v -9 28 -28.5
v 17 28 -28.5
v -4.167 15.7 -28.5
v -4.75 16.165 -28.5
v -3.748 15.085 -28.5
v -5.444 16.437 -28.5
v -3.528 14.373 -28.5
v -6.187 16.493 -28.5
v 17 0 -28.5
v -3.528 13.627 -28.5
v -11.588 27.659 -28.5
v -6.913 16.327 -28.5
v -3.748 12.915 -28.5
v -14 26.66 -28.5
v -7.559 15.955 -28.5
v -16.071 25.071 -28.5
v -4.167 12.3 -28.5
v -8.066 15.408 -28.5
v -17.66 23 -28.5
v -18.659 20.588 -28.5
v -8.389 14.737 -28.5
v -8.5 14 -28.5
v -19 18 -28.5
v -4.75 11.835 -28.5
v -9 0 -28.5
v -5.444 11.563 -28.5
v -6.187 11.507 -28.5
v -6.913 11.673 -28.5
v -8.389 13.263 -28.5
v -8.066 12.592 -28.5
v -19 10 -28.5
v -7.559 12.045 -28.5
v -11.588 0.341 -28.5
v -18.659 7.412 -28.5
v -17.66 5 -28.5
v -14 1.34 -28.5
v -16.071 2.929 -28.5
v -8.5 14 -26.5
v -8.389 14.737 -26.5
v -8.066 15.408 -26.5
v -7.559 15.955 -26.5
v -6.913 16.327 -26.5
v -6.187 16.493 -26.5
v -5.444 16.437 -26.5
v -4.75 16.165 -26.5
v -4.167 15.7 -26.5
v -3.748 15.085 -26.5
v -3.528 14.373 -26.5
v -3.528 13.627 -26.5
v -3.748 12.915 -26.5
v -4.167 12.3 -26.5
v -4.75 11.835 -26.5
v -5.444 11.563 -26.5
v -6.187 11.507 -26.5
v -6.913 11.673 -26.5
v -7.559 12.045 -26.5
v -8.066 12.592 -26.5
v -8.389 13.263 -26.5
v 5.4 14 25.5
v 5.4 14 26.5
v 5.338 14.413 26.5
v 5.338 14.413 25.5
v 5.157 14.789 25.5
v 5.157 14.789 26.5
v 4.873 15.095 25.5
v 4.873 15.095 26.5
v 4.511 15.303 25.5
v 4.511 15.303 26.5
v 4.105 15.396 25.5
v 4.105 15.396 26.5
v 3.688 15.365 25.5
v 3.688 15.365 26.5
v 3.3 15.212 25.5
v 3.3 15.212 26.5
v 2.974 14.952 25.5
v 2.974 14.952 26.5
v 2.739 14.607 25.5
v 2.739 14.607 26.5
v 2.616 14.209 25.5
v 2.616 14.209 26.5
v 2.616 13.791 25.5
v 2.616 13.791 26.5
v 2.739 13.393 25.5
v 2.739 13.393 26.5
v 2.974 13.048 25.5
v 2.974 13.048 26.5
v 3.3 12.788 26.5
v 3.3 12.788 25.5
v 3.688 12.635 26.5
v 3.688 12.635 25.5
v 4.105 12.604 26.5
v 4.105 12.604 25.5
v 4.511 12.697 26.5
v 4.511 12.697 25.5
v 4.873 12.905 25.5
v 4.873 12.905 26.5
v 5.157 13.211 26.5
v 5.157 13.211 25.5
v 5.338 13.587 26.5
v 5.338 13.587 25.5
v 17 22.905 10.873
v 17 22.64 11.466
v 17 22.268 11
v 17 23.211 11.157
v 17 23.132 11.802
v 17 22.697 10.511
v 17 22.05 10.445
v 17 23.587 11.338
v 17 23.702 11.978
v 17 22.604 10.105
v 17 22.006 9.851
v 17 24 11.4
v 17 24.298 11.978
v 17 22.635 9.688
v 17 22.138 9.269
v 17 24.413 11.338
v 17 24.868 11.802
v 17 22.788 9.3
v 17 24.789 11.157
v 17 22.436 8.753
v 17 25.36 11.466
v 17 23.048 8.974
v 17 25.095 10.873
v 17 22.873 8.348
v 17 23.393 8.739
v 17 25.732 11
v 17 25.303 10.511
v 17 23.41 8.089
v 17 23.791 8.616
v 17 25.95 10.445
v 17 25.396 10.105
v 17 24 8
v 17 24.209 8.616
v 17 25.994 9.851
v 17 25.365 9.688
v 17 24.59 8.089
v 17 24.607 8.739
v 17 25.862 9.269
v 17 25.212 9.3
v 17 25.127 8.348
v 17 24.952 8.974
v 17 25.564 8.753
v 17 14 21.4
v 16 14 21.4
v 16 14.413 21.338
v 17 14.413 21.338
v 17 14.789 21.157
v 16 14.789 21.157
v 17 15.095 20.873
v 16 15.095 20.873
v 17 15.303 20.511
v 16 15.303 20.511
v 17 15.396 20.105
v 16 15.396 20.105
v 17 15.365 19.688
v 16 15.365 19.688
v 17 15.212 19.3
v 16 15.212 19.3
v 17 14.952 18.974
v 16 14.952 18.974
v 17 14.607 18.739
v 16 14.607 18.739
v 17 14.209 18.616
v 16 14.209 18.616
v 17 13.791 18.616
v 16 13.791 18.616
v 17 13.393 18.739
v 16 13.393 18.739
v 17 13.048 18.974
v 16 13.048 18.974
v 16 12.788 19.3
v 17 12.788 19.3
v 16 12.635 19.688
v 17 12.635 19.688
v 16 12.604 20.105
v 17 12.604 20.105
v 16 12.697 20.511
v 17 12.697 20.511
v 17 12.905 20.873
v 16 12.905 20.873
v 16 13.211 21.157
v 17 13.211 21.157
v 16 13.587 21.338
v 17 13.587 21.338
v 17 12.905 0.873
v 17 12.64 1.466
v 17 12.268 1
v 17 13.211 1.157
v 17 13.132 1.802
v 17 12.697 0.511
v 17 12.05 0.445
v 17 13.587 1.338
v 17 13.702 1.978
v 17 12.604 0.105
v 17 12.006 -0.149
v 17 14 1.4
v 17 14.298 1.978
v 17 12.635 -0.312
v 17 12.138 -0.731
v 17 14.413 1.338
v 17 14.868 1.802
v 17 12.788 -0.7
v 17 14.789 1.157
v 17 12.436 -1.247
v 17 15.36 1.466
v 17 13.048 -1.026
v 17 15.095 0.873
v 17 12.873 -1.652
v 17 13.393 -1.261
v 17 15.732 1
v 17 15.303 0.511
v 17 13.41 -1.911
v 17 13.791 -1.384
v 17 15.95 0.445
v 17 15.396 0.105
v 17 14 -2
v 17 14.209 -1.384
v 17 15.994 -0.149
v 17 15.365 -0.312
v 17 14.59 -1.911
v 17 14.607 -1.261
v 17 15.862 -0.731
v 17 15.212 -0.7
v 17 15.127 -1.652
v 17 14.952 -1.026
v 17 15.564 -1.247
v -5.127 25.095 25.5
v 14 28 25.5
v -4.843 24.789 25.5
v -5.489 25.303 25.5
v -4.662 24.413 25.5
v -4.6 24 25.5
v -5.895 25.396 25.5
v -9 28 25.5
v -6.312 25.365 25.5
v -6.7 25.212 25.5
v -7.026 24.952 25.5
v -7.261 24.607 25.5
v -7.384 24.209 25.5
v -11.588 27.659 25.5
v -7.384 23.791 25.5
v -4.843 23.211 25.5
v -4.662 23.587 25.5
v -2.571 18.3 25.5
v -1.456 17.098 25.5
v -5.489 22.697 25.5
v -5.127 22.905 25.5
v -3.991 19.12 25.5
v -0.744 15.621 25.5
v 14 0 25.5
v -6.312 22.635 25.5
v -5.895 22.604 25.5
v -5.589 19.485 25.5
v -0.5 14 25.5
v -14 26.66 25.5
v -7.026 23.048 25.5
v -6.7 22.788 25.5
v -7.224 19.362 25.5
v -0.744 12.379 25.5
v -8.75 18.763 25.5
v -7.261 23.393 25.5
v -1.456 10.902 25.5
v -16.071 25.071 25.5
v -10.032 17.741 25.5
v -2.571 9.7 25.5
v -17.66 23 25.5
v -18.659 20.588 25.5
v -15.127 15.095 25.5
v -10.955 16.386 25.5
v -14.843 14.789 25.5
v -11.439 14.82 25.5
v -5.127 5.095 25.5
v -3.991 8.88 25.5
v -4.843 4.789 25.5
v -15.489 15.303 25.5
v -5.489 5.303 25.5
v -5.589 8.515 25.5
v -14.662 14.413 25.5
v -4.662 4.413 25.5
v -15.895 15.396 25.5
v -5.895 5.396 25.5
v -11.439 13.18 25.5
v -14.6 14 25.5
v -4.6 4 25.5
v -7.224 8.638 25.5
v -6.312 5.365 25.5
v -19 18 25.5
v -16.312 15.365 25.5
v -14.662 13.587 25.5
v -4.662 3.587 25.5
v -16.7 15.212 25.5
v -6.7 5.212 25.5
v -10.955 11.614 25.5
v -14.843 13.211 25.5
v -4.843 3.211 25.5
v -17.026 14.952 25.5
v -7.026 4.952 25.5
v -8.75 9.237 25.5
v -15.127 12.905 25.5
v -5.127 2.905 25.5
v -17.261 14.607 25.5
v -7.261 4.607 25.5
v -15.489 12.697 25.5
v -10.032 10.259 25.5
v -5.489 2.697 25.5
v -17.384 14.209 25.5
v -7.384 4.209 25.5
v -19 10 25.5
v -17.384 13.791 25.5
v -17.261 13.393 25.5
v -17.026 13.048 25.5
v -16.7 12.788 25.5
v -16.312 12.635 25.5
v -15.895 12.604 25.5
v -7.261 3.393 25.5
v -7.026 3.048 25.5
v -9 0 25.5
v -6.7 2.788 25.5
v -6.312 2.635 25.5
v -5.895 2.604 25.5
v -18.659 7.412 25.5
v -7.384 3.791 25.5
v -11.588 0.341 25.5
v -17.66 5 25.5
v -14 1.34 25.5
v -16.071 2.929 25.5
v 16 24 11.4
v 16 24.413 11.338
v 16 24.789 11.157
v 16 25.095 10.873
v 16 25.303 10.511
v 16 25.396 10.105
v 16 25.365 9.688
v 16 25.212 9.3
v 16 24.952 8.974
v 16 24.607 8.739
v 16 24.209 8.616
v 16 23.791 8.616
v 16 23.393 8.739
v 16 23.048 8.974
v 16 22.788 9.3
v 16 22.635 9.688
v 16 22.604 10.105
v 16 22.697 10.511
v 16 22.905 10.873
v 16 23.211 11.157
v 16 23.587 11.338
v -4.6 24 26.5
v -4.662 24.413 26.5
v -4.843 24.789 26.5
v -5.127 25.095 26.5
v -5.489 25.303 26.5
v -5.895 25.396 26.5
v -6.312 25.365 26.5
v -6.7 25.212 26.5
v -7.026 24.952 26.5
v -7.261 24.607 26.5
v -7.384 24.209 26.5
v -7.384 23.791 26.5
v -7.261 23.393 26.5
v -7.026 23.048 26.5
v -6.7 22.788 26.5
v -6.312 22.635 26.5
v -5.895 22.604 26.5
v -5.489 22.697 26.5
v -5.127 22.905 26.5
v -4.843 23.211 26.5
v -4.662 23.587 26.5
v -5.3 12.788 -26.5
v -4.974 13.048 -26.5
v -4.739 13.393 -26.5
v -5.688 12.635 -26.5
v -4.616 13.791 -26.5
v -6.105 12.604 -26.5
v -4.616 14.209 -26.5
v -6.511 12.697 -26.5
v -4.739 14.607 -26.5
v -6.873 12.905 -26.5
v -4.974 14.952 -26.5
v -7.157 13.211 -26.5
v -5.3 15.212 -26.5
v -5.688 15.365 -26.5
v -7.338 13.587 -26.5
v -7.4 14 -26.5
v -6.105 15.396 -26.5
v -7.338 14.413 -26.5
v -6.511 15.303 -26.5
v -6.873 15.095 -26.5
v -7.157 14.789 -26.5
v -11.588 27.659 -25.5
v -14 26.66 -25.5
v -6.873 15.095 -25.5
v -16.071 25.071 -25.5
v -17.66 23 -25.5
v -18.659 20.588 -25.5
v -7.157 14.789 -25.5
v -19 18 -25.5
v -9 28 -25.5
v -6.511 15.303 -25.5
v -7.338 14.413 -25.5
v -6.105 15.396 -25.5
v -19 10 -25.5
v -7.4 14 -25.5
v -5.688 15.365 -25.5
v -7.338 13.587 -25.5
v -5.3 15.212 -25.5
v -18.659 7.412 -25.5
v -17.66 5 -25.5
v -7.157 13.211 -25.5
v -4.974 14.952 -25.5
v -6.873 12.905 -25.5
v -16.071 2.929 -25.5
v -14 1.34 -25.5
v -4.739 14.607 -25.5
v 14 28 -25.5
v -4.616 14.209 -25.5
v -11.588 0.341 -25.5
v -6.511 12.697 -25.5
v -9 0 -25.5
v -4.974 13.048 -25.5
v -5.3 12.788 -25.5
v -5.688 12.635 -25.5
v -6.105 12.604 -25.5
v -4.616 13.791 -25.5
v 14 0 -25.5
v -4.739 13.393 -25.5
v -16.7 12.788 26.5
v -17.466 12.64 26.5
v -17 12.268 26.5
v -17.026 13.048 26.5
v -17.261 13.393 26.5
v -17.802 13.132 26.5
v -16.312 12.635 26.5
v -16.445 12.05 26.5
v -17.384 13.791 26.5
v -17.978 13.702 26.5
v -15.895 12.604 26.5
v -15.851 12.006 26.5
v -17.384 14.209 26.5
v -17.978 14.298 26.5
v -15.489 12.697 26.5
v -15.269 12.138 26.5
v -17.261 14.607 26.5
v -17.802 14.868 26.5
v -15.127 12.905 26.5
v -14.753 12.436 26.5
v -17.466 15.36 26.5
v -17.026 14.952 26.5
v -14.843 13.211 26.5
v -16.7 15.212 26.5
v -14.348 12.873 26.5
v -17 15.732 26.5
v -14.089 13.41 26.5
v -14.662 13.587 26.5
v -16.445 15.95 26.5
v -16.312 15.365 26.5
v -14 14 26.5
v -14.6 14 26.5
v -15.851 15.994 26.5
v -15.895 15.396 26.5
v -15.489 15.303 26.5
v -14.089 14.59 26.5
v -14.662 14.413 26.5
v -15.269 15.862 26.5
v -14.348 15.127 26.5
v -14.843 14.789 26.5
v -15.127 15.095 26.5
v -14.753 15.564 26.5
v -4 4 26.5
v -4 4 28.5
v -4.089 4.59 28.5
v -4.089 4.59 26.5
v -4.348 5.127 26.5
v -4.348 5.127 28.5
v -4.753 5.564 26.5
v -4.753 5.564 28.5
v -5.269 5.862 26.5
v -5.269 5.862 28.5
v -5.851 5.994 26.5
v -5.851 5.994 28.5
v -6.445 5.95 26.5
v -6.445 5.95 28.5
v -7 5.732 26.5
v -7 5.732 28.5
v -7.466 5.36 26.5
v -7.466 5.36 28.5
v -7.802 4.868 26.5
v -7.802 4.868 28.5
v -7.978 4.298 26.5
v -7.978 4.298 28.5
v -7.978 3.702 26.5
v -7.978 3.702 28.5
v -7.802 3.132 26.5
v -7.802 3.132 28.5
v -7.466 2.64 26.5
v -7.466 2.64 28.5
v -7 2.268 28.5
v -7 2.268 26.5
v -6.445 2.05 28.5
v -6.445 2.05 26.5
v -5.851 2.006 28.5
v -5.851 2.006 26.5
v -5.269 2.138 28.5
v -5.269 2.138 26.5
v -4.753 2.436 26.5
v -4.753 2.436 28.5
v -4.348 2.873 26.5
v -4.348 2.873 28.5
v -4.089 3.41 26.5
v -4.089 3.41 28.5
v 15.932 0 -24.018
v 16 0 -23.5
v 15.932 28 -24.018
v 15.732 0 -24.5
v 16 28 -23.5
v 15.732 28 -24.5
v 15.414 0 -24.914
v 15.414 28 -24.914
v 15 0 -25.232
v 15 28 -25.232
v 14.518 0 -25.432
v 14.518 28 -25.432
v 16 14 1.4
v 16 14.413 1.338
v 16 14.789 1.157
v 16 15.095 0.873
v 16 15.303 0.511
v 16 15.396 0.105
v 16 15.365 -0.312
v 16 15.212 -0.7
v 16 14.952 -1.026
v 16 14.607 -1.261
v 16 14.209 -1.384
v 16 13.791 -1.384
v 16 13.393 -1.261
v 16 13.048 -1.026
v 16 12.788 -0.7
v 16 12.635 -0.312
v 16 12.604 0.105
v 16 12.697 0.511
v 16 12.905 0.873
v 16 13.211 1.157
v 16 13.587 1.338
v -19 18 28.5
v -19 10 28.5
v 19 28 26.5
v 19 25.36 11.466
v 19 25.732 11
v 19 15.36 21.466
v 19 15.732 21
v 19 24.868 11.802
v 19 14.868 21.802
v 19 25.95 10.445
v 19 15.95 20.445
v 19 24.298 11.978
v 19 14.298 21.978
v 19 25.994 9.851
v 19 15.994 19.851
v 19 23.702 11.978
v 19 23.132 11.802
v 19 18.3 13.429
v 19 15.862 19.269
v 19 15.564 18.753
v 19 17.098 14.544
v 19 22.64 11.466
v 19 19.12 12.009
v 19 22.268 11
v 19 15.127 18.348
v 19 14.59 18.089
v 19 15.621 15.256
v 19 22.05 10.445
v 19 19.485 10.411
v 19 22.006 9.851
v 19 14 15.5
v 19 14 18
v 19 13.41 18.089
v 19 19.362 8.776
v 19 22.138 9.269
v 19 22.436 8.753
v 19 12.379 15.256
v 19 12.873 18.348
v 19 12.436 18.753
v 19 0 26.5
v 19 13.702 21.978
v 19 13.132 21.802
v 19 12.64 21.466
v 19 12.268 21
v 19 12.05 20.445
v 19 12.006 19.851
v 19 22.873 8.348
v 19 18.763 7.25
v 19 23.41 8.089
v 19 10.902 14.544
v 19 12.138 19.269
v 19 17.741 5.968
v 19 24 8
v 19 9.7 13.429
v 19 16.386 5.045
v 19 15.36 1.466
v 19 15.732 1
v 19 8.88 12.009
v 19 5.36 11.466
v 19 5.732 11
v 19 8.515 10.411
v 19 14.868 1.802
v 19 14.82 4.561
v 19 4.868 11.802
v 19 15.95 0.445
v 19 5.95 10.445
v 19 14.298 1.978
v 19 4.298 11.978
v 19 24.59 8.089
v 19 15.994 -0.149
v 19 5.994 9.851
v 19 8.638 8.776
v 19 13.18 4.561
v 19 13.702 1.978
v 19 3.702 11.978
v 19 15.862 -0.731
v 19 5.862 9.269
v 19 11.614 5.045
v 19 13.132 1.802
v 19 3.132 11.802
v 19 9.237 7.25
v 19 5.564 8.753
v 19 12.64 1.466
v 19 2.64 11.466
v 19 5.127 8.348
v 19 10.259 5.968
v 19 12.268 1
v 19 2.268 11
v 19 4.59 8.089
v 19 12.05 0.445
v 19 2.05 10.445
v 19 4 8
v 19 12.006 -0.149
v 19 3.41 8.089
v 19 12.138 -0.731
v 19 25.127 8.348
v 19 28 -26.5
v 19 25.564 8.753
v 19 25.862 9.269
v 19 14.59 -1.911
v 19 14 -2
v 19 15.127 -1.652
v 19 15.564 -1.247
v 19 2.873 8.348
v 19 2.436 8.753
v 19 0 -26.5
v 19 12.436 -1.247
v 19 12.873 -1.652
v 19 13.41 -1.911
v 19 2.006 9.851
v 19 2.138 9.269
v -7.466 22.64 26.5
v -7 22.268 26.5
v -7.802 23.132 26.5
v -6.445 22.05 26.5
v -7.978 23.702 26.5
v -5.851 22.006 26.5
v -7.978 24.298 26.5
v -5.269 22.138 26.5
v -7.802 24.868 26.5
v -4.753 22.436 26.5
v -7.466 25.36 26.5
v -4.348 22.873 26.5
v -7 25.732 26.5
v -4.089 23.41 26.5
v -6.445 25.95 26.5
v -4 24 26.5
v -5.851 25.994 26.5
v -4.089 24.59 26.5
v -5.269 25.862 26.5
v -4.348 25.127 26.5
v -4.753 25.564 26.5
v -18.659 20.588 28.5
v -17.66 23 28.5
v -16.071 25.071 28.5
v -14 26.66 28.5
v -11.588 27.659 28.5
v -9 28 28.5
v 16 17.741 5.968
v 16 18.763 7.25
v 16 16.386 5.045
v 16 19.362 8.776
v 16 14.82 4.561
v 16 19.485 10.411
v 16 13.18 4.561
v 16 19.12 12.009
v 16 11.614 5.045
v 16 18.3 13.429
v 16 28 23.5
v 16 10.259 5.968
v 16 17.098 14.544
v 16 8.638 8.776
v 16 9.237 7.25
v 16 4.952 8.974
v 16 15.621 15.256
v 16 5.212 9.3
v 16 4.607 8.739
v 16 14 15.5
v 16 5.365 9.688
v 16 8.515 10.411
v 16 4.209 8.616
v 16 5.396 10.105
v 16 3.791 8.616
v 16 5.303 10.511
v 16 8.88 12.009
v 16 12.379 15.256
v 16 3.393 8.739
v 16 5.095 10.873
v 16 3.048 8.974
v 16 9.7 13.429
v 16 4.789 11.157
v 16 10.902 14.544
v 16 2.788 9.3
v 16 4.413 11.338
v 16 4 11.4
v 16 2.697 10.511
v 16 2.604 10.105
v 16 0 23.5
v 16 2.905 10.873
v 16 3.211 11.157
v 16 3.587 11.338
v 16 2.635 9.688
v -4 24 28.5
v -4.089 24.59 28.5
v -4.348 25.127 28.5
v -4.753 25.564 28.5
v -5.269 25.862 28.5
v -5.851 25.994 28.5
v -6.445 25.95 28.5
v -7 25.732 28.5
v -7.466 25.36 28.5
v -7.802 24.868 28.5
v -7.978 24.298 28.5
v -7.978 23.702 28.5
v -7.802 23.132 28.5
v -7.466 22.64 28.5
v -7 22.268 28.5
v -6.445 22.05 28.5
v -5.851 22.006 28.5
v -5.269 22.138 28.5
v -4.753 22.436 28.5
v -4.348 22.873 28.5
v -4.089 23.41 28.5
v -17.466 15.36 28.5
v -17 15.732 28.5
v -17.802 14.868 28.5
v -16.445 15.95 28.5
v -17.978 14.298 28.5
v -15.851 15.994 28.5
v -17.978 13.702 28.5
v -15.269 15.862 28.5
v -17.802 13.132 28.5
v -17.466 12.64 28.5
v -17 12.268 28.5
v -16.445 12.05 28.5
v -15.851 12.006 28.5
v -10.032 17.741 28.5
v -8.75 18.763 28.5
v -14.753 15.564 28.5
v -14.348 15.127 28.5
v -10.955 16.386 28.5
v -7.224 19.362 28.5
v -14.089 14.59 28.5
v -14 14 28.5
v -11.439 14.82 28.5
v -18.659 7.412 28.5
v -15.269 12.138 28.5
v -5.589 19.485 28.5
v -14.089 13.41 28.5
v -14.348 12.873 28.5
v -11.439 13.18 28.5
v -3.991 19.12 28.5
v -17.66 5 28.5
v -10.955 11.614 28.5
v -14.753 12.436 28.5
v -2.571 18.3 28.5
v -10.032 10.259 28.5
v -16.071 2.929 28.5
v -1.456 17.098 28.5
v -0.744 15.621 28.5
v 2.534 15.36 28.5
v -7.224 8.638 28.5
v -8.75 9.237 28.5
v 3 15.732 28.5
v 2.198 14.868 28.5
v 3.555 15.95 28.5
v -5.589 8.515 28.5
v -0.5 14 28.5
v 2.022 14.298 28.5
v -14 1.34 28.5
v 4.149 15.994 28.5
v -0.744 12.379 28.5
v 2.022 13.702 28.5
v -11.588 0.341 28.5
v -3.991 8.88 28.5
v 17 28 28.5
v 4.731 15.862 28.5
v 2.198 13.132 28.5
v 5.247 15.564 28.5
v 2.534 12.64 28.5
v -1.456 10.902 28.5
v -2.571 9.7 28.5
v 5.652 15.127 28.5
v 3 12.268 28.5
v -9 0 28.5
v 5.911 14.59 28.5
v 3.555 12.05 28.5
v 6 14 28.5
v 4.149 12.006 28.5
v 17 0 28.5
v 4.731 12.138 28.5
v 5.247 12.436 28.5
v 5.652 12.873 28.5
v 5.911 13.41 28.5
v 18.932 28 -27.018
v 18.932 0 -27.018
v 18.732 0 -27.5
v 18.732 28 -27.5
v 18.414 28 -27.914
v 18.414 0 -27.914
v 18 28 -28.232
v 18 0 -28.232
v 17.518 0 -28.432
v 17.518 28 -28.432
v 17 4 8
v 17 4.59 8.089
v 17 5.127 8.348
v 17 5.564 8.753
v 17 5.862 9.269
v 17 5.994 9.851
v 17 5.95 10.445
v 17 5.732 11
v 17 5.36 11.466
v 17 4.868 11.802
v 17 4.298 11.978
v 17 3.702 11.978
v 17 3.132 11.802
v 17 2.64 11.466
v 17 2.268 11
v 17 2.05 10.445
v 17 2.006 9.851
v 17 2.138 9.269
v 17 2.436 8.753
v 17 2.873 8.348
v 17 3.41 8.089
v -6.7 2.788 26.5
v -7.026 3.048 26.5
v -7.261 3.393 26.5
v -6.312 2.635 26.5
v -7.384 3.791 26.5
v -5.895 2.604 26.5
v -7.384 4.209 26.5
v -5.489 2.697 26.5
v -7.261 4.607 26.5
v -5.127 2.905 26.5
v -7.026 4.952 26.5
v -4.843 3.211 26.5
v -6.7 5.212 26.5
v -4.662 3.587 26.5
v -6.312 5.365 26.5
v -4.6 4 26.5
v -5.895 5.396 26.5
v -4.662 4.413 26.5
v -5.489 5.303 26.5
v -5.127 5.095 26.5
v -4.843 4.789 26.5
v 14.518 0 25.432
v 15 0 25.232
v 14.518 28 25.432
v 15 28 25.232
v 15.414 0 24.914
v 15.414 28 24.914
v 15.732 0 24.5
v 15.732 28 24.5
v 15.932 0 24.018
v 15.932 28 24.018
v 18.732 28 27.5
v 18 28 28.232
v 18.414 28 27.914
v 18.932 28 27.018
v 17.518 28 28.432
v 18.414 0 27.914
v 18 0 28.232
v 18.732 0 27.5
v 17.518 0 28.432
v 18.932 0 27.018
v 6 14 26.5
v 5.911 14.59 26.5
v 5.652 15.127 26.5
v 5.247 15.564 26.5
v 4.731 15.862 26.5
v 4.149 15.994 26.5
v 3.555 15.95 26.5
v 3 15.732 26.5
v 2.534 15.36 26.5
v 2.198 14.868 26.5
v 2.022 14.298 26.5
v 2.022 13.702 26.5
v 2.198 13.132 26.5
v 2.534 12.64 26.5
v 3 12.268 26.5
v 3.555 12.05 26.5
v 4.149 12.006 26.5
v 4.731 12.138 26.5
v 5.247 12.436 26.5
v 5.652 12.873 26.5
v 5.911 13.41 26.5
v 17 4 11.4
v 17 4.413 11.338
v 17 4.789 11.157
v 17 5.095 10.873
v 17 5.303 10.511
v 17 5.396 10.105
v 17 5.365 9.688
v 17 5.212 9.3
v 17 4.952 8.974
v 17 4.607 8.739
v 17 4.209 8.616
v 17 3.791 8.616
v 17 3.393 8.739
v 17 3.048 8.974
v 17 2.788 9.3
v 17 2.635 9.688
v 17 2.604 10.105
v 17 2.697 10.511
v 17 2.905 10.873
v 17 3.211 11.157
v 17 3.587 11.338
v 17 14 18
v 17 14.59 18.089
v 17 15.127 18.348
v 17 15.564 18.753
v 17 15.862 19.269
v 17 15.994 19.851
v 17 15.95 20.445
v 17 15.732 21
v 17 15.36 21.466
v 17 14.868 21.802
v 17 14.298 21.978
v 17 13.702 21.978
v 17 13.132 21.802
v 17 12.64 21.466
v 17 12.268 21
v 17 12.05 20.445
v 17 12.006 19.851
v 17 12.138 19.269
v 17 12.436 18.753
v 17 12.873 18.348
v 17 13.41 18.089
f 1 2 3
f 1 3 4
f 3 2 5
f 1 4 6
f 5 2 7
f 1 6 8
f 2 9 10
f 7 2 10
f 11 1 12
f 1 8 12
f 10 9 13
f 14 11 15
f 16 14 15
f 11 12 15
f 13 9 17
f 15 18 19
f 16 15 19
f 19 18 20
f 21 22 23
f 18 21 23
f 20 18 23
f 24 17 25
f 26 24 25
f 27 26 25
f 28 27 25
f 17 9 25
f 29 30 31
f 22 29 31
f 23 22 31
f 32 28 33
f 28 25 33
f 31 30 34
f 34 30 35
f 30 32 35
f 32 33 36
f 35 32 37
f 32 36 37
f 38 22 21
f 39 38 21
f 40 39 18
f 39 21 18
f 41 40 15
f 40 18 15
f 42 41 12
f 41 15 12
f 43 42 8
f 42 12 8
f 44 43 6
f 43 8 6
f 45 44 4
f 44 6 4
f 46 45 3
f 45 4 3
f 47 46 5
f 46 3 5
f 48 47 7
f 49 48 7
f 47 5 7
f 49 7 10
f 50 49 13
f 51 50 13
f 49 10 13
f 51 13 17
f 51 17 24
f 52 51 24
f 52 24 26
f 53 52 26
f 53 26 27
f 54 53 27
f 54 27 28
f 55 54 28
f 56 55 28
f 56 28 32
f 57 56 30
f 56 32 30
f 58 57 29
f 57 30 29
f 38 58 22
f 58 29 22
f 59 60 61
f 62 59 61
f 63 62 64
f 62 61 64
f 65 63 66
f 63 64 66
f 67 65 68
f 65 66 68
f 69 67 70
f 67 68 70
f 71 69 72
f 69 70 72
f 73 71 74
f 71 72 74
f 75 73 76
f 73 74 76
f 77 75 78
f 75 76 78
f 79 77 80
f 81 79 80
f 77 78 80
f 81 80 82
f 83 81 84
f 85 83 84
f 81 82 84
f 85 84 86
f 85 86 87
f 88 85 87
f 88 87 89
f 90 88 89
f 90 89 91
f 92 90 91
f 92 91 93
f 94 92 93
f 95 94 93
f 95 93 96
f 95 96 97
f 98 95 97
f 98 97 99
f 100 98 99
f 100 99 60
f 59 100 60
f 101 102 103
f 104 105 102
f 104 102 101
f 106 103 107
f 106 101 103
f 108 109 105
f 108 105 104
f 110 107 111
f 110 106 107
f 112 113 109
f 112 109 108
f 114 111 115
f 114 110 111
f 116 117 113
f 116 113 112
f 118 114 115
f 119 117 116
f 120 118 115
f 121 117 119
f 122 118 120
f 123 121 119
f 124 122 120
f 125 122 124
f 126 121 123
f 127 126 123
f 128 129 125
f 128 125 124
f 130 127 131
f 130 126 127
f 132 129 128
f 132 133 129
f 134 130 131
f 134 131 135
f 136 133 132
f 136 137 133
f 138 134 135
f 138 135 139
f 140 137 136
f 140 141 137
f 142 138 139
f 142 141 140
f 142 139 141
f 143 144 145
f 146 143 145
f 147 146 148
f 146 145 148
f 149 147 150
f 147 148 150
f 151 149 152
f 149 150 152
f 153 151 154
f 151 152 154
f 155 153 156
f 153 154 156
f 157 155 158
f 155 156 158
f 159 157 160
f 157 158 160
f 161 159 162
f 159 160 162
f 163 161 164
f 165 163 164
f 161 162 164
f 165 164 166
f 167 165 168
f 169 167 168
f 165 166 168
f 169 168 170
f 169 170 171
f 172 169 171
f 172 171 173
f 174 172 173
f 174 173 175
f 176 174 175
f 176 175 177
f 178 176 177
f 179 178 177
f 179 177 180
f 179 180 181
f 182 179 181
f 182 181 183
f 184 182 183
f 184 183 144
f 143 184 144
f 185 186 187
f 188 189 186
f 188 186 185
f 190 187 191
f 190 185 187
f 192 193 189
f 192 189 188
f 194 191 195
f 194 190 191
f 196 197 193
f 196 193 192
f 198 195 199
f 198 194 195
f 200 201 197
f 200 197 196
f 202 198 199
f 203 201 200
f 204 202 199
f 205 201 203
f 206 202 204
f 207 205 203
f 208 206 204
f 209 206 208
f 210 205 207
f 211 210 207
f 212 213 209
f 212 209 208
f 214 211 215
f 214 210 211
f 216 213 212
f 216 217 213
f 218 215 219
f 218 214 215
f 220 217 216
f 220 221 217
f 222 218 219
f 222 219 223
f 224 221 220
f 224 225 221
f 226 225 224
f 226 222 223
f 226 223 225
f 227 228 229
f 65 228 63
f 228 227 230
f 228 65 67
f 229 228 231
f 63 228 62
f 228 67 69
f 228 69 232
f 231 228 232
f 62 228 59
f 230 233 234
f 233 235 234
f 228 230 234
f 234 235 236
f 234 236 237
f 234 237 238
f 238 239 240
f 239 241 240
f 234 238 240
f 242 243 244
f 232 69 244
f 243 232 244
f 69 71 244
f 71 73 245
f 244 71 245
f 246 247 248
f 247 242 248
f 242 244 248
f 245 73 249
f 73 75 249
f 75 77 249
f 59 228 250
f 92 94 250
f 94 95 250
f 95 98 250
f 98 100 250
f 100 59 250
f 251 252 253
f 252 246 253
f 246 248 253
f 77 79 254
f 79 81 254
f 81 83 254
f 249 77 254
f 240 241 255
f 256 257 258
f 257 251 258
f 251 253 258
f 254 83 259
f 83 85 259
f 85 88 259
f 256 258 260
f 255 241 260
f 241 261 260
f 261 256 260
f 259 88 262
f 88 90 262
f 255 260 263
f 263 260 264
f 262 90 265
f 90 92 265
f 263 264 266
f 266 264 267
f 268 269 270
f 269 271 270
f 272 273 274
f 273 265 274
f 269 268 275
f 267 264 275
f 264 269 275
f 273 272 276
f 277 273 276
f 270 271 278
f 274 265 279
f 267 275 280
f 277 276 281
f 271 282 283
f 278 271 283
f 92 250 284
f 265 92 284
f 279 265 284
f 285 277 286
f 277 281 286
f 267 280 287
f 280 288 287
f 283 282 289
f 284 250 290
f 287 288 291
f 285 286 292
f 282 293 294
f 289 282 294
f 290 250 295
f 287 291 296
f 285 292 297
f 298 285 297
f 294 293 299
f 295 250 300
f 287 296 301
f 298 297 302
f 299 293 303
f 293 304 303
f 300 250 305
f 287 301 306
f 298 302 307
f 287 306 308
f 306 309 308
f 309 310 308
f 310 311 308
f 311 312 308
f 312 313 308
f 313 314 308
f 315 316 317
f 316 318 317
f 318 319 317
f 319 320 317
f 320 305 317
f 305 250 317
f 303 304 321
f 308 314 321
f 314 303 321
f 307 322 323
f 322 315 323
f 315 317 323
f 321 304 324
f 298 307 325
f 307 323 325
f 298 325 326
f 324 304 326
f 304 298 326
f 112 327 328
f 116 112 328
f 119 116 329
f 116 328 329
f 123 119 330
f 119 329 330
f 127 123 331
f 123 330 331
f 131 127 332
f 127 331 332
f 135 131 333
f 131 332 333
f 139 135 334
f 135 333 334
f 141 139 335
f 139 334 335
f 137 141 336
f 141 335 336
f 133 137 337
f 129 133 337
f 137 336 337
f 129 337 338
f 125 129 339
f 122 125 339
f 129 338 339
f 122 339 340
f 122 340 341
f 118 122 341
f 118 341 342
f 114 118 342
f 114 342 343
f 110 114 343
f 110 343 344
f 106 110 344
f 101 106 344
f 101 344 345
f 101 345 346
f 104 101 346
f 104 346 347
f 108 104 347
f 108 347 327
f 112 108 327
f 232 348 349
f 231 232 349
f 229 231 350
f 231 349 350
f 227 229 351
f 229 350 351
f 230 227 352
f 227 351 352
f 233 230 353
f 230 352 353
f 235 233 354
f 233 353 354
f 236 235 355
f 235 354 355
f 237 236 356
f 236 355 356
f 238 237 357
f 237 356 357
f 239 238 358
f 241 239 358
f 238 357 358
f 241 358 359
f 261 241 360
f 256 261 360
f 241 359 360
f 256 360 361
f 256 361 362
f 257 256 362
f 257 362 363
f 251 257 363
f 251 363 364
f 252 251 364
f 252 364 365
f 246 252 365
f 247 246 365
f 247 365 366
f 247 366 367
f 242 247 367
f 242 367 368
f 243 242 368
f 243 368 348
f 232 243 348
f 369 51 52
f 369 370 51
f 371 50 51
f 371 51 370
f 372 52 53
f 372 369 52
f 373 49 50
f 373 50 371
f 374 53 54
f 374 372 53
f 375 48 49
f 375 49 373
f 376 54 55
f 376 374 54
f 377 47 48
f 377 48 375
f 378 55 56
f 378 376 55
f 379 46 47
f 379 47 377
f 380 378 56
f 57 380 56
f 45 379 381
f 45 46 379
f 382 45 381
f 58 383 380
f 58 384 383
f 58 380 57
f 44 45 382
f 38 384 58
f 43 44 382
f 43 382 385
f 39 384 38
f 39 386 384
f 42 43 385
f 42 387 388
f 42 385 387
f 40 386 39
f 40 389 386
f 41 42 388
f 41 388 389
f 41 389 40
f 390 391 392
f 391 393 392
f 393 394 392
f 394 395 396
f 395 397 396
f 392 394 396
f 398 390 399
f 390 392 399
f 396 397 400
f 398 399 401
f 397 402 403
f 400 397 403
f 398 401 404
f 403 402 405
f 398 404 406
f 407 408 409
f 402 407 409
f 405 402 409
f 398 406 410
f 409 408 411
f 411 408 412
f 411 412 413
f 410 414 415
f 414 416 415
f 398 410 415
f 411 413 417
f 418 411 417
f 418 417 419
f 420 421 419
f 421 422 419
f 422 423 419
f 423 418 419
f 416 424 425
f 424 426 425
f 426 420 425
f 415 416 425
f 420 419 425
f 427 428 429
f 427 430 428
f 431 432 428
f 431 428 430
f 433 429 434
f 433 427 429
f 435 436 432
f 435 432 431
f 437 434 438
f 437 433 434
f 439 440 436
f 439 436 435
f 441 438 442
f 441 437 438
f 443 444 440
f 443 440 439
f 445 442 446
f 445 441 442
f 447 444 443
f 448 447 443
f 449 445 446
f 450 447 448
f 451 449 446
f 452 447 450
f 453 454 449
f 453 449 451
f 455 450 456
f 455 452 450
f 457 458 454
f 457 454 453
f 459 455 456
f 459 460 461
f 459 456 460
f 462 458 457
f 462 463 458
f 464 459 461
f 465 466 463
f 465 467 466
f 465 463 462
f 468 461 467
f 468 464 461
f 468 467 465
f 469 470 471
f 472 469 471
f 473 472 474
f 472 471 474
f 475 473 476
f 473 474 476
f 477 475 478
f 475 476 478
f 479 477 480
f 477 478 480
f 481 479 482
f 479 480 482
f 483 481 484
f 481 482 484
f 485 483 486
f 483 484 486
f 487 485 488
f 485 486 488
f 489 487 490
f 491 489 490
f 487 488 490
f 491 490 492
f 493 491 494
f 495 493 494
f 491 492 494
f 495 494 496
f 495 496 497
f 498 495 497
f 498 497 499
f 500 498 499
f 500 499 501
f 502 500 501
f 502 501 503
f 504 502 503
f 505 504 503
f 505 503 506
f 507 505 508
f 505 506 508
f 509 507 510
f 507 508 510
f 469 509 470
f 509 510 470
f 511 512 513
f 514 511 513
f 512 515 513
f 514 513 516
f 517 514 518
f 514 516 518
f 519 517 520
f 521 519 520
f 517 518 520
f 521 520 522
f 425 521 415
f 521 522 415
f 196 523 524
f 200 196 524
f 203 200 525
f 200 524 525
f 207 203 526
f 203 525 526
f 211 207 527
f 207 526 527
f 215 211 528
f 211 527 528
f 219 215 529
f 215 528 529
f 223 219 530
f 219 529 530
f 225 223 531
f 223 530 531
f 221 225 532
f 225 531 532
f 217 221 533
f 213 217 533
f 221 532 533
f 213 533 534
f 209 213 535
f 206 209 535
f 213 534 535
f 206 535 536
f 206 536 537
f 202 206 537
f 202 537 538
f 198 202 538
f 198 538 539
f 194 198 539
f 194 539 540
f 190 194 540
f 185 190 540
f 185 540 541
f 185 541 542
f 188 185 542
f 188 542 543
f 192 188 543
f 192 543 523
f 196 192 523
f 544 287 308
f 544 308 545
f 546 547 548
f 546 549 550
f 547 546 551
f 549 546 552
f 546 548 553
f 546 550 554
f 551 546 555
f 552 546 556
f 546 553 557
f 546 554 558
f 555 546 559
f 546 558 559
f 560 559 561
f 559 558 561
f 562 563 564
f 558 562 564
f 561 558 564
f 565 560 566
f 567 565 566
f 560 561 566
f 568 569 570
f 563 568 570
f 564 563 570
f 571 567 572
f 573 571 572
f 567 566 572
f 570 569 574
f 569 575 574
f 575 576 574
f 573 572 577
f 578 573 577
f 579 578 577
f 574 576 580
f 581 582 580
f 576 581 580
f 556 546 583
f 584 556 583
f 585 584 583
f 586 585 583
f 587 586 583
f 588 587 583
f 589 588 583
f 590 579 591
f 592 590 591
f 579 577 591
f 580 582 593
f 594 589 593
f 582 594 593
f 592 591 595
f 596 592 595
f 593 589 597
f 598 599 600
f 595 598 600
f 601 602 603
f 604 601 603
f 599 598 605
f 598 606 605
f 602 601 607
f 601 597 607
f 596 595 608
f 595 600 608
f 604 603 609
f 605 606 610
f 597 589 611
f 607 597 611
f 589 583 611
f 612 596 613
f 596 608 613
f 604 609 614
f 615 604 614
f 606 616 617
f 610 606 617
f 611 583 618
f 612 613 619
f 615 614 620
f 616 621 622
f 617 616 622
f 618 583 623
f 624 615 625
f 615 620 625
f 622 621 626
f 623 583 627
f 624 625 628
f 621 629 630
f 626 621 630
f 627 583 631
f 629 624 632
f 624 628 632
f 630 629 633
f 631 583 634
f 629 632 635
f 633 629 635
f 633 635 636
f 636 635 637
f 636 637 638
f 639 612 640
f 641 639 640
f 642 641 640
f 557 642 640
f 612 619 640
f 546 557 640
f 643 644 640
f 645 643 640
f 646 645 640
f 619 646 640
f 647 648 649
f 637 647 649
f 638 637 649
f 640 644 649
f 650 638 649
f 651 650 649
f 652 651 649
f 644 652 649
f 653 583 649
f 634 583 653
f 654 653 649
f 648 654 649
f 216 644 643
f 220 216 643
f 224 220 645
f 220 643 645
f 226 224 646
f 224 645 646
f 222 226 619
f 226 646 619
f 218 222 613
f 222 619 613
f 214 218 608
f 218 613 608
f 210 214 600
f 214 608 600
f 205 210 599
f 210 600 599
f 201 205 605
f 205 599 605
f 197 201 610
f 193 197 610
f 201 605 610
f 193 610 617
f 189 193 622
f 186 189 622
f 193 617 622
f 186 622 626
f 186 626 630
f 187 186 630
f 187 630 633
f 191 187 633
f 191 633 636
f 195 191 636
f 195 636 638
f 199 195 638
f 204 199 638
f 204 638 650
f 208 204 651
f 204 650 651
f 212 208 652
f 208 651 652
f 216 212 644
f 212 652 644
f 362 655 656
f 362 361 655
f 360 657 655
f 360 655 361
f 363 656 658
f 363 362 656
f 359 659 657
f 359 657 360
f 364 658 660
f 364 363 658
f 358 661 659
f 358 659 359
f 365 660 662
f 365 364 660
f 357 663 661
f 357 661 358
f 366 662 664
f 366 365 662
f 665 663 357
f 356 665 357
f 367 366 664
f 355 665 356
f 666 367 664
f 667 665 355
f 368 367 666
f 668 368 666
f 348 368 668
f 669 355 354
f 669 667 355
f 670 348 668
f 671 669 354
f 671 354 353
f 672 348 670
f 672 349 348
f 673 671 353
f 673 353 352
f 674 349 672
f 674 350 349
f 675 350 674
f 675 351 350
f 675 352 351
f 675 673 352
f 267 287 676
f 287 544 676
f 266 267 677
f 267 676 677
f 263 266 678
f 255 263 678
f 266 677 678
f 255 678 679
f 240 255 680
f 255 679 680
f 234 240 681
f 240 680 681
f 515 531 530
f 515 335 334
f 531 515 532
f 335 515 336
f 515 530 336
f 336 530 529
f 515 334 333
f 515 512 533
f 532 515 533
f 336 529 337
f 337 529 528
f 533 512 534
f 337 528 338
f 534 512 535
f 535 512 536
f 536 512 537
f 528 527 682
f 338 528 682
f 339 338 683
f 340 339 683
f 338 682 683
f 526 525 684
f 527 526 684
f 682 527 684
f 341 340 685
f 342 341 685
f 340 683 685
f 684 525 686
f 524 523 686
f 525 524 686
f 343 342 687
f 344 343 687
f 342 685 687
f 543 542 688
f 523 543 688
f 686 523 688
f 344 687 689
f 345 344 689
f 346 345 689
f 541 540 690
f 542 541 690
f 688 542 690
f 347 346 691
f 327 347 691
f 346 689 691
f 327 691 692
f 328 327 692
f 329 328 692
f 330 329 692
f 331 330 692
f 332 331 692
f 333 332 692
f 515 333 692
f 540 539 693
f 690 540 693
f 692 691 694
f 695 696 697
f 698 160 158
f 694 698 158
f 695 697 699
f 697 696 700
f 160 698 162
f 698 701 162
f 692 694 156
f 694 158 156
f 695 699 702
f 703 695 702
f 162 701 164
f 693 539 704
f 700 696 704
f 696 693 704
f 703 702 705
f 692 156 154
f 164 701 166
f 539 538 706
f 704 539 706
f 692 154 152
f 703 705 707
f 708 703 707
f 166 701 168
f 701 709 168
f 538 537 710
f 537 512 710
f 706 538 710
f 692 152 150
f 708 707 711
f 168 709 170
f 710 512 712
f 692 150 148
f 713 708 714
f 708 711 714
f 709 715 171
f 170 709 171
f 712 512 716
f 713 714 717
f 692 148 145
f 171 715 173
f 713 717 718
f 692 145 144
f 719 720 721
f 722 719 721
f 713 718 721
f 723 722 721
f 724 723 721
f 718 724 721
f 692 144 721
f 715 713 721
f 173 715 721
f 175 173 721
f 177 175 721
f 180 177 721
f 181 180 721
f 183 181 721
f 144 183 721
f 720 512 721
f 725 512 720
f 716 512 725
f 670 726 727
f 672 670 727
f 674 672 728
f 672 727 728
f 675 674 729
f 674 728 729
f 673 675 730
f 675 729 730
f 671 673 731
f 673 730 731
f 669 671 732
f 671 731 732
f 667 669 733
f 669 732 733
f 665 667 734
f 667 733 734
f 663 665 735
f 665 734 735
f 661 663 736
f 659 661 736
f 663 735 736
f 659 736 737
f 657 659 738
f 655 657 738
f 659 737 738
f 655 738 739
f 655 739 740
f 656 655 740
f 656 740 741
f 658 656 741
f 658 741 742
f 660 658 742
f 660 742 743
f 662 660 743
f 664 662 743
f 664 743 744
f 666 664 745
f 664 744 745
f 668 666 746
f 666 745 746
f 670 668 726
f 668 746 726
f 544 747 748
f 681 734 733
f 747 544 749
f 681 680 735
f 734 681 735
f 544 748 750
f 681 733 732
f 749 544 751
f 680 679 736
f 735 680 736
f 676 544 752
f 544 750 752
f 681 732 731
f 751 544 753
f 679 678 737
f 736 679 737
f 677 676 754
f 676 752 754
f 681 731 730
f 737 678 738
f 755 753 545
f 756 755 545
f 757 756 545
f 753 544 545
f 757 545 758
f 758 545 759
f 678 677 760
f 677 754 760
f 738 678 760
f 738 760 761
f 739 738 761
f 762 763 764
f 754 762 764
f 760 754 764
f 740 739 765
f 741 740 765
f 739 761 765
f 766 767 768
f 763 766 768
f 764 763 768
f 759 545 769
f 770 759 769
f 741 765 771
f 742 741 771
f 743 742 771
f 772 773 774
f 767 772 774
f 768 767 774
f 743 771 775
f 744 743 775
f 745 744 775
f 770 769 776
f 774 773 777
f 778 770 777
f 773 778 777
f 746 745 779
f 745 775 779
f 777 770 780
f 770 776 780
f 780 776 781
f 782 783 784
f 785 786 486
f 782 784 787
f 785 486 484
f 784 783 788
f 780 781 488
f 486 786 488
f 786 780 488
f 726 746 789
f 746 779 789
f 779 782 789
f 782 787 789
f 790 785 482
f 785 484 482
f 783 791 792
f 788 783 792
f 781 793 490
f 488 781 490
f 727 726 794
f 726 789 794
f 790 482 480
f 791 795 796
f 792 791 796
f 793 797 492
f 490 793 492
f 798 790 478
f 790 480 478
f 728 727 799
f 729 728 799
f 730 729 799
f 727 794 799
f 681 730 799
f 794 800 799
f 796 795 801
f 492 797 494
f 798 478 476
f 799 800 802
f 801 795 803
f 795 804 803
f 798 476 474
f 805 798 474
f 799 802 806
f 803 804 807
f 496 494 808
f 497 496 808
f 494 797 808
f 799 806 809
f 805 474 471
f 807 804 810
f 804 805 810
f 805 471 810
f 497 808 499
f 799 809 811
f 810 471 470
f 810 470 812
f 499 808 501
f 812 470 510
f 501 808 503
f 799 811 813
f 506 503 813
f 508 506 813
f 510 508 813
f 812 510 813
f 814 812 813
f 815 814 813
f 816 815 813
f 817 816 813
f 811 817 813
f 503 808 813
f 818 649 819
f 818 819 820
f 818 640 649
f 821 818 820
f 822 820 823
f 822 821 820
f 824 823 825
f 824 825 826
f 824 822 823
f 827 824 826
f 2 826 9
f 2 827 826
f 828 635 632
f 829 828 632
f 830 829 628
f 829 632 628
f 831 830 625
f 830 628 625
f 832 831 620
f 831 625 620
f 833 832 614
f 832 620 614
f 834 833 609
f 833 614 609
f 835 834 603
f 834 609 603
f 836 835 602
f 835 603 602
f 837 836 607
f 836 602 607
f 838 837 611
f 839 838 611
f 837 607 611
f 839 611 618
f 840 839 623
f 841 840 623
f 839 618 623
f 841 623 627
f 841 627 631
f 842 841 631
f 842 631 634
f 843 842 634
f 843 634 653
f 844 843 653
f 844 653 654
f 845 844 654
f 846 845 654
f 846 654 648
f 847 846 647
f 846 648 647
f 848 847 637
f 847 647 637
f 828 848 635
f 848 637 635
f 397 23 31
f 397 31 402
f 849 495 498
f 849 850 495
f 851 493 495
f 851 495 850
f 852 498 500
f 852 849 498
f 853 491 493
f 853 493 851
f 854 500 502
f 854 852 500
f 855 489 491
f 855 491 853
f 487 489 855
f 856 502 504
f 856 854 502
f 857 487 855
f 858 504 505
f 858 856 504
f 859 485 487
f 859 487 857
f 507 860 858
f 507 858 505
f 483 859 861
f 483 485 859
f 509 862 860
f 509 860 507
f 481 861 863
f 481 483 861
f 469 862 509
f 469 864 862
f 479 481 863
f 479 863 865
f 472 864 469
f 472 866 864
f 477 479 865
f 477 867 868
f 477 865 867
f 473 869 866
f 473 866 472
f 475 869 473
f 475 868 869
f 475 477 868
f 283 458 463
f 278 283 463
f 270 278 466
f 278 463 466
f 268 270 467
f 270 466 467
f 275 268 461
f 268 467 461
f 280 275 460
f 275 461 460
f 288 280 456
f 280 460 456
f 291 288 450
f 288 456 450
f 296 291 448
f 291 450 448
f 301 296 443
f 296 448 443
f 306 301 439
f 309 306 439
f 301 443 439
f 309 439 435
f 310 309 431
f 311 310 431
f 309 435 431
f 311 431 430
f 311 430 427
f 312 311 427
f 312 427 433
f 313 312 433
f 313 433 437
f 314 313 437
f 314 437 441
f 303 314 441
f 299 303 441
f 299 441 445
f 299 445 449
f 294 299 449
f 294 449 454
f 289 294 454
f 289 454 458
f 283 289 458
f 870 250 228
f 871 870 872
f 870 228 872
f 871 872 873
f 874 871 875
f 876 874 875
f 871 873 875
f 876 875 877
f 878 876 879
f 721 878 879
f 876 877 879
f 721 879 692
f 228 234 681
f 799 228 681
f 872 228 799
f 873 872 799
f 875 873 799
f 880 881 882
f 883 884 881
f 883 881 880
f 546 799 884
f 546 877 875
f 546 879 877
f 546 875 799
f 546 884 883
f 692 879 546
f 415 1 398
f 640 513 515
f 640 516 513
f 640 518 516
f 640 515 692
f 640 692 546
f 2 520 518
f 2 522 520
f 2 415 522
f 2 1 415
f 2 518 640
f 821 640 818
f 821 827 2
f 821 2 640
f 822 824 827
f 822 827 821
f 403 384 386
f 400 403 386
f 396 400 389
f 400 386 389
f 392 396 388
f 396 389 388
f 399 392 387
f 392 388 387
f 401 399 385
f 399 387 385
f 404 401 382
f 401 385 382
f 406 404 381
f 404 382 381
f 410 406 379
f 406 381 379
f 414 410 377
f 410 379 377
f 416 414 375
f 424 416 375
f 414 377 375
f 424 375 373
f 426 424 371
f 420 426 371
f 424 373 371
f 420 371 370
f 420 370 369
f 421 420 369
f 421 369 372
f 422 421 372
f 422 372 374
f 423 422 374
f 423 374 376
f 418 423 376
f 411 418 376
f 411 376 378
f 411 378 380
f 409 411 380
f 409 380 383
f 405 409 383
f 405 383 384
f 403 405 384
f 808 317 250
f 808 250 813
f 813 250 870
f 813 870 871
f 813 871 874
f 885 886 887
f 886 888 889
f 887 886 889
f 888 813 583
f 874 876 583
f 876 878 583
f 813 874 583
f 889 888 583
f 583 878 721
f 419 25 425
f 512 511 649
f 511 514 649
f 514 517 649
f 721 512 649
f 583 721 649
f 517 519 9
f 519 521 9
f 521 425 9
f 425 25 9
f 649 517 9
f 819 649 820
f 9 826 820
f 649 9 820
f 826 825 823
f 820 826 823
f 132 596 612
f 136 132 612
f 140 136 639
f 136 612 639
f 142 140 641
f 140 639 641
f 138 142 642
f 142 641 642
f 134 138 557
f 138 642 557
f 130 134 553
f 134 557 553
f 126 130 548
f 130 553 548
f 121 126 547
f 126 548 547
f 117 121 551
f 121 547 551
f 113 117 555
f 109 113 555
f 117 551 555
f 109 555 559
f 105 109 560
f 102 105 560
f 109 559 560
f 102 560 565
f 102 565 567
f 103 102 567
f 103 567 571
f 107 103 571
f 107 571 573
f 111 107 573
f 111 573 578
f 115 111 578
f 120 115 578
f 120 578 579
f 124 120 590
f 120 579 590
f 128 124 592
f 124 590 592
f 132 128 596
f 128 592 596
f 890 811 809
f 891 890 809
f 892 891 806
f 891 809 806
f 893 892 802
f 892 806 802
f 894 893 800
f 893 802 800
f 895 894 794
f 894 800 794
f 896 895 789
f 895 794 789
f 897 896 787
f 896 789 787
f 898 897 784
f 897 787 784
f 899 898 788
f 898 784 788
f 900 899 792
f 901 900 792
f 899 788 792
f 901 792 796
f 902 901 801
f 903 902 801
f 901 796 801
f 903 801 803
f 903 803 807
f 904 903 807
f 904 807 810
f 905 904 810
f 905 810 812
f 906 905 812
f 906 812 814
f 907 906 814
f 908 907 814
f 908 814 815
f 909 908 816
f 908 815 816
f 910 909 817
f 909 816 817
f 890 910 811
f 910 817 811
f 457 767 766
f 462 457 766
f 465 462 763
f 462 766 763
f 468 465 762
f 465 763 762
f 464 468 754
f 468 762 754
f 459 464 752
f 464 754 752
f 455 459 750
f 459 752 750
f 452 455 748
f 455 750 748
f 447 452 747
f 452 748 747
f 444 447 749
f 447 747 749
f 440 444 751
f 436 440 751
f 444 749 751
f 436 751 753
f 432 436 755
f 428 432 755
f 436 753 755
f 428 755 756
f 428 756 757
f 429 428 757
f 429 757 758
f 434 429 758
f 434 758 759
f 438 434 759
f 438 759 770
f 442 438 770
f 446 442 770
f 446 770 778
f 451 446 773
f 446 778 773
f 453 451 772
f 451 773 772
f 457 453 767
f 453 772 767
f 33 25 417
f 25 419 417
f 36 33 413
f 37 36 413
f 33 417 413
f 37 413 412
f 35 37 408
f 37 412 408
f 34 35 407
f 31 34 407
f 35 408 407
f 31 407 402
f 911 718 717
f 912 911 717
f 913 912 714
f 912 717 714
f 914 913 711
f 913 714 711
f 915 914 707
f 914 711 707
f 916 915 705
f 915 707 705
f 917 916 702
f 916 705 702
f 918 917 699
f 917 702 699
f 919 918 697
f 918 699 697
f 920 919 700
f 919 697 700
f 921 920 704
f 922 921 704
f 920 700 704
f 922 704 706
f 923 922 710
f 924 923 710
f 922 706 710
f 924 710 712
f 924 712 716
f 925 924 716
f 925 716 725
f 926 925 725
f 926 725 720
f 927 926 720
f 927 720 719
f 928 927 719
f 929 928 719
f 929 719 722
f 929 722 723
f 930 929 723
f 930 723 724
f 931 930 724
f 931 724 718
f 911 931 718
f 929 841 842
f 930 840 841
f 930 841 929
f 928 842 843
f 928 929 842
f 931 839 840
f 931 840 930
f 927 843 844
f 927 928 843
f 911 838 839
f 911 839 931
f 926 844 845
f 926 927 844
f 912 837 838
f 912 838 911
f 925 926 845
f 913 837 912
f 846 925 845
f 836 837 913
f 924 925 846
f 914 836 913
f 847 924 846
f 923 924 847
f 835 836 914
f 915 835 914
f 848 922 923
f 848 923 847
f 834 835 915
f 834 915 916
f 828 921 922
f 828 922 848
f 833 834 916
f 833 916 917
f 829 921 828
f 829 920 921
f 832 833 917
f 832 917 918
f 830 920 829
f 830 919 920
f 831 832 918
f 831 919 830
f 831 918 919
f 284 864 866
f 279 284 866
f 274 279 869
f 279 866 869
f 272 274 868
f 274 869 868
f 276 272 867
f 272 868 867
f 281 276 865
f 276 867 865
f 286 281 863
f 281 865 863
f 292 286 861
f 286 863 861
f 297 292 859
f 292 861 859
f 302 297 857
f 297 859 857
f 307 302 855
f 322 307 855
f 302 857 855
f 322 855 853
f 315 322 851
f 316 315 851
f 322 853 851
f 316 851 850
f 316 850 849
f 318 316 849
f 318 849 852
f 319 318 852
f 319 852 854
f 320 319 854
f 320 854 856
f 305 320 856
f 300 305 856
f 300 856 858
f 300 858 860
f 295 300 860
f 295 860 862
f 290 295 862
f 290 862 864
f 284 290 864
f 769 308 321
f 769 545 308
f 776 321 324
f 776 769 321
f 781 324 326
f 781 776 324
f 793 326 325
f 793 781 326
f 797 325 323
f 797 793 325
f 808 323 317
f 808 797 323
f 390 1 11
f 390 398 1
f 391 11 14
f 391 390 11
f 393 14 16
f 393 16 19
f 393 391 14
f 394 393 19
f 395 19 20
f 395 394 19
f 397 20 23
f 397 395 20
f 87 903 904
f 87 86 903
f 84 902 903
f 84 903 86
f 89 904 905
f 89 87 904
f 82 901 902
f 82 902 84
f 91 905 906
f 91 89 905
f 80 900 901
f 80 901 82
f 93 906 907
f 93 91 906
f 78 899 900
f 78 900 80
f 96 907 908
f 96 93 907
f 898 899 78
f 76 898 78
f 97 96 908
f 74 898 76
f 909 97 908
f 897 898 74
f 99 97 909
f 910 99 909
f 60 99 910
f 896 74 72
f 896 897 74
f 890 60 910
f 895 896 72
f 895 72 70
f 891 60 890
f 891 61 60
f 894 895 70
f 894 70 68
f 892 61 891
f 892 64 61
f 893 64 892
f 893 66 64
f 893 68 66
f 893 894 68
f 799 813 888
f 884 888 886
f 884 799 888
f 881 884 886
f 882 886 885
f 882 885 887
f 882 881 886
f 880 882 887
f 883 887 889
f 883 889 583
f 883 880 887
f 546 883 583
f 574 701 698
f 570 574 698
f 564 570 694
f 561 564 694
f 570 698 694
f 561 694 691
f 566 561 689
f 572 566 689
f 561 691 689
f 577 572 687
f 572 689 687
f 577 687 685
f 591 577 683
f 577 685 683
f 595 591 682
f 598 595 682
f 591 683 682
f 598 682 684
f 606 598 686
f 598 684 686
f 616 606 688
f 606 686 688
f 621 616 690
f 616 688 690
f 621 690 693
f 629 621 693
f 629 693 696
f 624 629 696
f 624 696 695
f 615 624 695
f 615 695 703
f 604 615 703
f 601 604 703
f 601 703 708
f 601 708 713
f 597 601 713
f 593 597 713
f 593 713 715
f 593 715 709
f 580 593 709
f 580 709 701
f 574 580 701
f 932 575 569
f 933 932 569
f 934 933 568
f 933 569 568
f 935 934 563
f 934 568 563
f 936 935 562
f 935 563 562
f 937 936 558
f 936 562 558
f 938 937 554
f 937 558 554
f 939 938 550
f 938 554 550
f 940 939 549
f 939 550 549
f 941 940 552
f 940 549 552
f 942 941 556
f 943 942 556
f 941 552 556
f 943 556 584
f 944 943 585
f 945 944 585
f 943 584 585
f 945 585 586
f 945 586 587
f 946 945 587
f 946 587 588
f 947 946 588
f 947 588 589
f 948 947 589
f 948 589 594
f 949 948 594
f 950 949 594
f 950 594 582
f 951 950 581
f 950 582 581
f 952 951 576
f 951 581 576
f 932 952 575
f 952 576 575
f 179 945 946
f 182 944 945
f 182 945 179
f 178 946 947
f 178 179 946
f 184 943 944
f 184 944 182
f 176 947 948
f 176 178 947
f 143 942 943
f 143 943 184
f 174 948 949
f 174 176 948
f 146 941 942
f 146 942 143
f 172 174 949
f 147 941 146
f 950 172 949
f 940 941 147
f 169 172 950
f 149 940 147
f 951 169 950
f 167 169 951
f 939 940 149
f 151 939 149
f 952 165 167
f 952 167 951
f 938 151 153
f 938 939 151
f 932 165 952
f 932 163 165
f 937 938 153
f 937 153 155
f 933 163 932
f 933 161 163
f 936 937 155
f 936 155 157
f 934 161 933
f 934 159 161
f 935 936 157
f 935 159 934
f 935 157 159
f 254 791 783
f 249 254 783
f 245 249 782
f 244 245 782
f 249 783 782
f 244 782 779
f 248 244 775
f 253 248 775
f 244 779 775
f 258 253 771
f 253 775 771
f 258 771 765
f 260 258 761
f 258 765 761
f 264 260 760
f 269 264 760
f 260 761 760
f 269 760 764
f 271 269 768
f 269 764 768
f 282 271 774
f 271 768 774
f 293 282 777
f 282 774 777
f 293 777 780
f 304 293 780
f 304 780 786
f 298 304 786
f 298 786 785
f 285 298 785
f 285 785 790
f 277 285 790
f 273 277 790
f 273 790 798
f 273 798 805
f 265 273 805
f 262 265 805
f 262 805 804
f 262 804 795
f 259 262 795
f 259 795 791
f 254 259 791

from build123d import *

# Parameters (mm, degrees)
BOSS_EXTRUDE1_DEPTH = 28
SKETCH2_R           = 1.4
SKETCH2_R_2         = 5.5
CUT_EXTRUDE1_DEPTH  = 54.115440316
CUT_EXTRUDE2_REACH  = 68.287
SKETCH3_R           = 1.4
SKETCH3_R_2         = 5.5
CUT_EXTRUDE3_REACH  = 68.287
SKETCH4_R           = 1.4
SKETCH5_R           = 2
CUT_EXTRUDE4_DEPTH  = 2
SKETCH6_R           = 2
CUT_EXTRUDE5_DEPTH  = 2
SKETCH7_R           = 2.5
CUT_EXTRUDE6_DEPTH  = 2
FILLET1_R           = 10
FILLET2_R           = 2


with BuildPart() as part:
    # Sketch1 → Boss-Extrude1 (new body)
    with BuildSketch(Plane(origin=(0, 0, 0), x_dir=(1, 0, 0), z_dir=(0, 1, 0))):
        Polygon((-19, -28.5), (19, -28.5), (19, 28.5), (-19, 28.5), (-19, 25.5), (16, 25.5), (16, -25.5), (-19, -25.5), align=None)
    extrude(amount=BOSS_EXTRUDE1_DEPTH)

    # Sketch2 → Cut-Extrude1 (cut, through all)
    with BuildSketch(Plane.ZY.offset(-16)):
        with Locations((10, 4)):
            Circle(SKETCH2_R)
        with Locations((10, 24)):
            Circle(SKETCH2_R)
        with Locations((0, 14)):
            Circle(SKETCH2_R)
        with Locations((20, 14)):
            Circle(SKETCH2_R)
        with Locations((10, 14)):
            Circle(SKETCH2_R_2)
    extrude(amount=-CUT_EXTRUDE1_DEPTH, mode=Mode.SUBTRACT)

    # Sketch3 → Cut-Extrude2 (cut, up to next)
    with BuildSketch(Plane.XY.offset(28.5), mode=Mode.PRIVATE) as cut_extrude2_sk1:
        with Locations((-16, 14)):
            Circle(SKETCH3_R)
    cut_extrude2_tool1 = extrude(cut_extrude2_sk1.sketch, amount=-CUT_EXTRUDE2_REACH, mode=Mode.PRIVATE) & part.part
    # Sketch3 → Cut-Extrude2 (cut, up to next)
    with BuildSketch(Plane.XY.offset(28.5), mode=Mode.PRIVATE) as cut_extrude2_sk2:
        with Locations((-6, 4)):
            Circle(SKETCH3_R)
    cut_extrude2_tool2 = extrude(cut_extrude2_sk2.sketch, amount=-CUT_EXTRUDE2_REACH, mode=Mode.PRIVATE) & part.part
    # Sketch3 → Cut-Extrude2 (cut, up to next)
    with BuildSketch(Plane.XY.offset(28.5), mode=Mode.PRIVATE) as cut_extrude2_sk3:
        with Locations((4, 14)):
            Circle(SKETCH3_R)
    cut_extrude2_tool3 = extrude(cut_extrude2_sk3.sketch, amount=-CUT_EXTRUDE2_REACH, mode=Mode.PRIVATE) & part.part
    # Sketch3 → Cut-Extrude2 (cut, up to next)
    with BuildSketch(Plane.XY.offset(28.5), mode=Mode.PRIVATE) as cut_extrude2_sk4:
        with Locations((-6, 24)):
            Circle(SKETCH3_R)
    cut_extrude2_tool4 = extrude(cut_extrude2_sk4.sketch, amount=-CUT_EXTRUDE2_REACH, mode=Mode.PRIVATE) & part.part
    # Sketch3 → Cut-Extrude2 (cut, up to next)
    with BuildSketch(Plane.XY.offset(28.5), mode=Mode.PRIVATE) as cut_extrude2_sk5:
        with Locations((-6, 14)):
            Circle(SKETCH3_R_2)
    cut_extrude2_tool5 = extrude(cut_extrude2_sk5.sketch, amount=-CUT_EXTRUDE2_REACH, mode=Mode.PRIVATE) & part.part
    add(cut_extrude2_tool1.solids().sort_by_distance((-16, 14, 28.5))[0], mode=Mode.SUBTRACT)
    add(cut_extrude2_tool2.solids().sort_by_distance((-6, 4, 28.5))[0], mode=Mode.SUBTRACT)
    add(cut_extrude2_tool3.solids().sort_by_distance((4, 14, 28.5))[0], mode=Mode.SUBTRACT)
    add(cut_extrude2_tool4.solids().sort_by_distance((-6, 24, 28.5))[0], mode=Mode.SUBTRACT)
    add(cut_extrude2_tool5.solids().sort_by_distance((-6, 14, 28.5))[0], mode=Mode.SUBTRACT)

    # Sketch4 → Cut-Extrude3 (cut, up to next)
    with BuildSketch(Plane(origin=(0, 0, -28.5), x_dir=(-1, 0, 0), z_dir=(0, 0, -1)), mode=Mode.PRIVATE) as cut_extrude3_sk1:
        with Locations((6, 14)):
            Circle(SKETCH4_R)
    cut_extrude3_tool1 = extrude(cut_extrude3_sk1.sketch, amount=-CUT_EXTRUDE3_REACH, mode=Mode.PRIVATE) & part.part
    add(cut_extrude3_tool1.solids().sort_by_distance((-6, 14, -28.5))[0], mode=Mode.SUBTRACT)

    # Sketch5 → Cut-Extrude4 (cut)
    with BuildSketch(Plane.XY.offset(28.5)):
        with Locations((-16, 14)):
            Circle(SKETCH5_R)
        with Locations((-6, 24)):
            Circle(SKETCH5_R)
        with Locations((4, 14)):
            Circle(SKETCH5_R)
        with Locations((-6, 4)):
            Circle(SKETCH5_R)
    extrude(amount=-CUT_EXTRUDE4_DEPTH, mode=Mode.SUBTRACT)

    # Sketch6 → Cut-Extrude5 (cut)
    with BuildSketch(Plane(origin=(19, 0, 0), x_dir=(0, 0, -1), z_dir=(1, 0, 0))):
        with Locations((-10, 24)):
            Circle(SKETCH6_R)
        with Locations((0, 14)):
            Circle(SKETCH6_R)
        with Locations((-10, 4)):
            Circle(SKETCH6_R)
        with Locations((-20, 14)):
            Circle(SKETCH6_R)
    extrude(amount=-CUT_EXTRUDE5_DEPTH, mode=Mode.SUBTRACT)

    # Sketch7 → Cut-Extrude6 (cut)
    with BuildSketch(Plane(origin=(0, 0, -28.5), x_dir=(-1, 0, 0), z_dir=(0, 0, -1))):
        with Locations((6, 14)):
            Circle(SKETCH7_R)
    extrude(amount=-CUT_EXTRUDE6_DEPTH, mode=Mode.SUBTRACT)

    # Fillet1
    fillet1_edges = [part.edges().sort_by_distance(p)[0] for p in [
        (-19, 0, 27),
        (-19, 28, 27),
        (-19, 28, -27),
        (-19, 0, -27),
    ]]
    fillet(fillet1_edges, radius=FILLET1_R)

    # Fillet2
    fillet2_edges = [part.edges().sort_by_distance(p)[0] for p in [
        (19, 14, -28.5),
        (19, 14, 28.5),
        (16, 14, 25.5),
        (16, 14, -25.5),
    ]]
    fillet(fillet2_edges, radius=FILLET2_R)


solid = part.part
